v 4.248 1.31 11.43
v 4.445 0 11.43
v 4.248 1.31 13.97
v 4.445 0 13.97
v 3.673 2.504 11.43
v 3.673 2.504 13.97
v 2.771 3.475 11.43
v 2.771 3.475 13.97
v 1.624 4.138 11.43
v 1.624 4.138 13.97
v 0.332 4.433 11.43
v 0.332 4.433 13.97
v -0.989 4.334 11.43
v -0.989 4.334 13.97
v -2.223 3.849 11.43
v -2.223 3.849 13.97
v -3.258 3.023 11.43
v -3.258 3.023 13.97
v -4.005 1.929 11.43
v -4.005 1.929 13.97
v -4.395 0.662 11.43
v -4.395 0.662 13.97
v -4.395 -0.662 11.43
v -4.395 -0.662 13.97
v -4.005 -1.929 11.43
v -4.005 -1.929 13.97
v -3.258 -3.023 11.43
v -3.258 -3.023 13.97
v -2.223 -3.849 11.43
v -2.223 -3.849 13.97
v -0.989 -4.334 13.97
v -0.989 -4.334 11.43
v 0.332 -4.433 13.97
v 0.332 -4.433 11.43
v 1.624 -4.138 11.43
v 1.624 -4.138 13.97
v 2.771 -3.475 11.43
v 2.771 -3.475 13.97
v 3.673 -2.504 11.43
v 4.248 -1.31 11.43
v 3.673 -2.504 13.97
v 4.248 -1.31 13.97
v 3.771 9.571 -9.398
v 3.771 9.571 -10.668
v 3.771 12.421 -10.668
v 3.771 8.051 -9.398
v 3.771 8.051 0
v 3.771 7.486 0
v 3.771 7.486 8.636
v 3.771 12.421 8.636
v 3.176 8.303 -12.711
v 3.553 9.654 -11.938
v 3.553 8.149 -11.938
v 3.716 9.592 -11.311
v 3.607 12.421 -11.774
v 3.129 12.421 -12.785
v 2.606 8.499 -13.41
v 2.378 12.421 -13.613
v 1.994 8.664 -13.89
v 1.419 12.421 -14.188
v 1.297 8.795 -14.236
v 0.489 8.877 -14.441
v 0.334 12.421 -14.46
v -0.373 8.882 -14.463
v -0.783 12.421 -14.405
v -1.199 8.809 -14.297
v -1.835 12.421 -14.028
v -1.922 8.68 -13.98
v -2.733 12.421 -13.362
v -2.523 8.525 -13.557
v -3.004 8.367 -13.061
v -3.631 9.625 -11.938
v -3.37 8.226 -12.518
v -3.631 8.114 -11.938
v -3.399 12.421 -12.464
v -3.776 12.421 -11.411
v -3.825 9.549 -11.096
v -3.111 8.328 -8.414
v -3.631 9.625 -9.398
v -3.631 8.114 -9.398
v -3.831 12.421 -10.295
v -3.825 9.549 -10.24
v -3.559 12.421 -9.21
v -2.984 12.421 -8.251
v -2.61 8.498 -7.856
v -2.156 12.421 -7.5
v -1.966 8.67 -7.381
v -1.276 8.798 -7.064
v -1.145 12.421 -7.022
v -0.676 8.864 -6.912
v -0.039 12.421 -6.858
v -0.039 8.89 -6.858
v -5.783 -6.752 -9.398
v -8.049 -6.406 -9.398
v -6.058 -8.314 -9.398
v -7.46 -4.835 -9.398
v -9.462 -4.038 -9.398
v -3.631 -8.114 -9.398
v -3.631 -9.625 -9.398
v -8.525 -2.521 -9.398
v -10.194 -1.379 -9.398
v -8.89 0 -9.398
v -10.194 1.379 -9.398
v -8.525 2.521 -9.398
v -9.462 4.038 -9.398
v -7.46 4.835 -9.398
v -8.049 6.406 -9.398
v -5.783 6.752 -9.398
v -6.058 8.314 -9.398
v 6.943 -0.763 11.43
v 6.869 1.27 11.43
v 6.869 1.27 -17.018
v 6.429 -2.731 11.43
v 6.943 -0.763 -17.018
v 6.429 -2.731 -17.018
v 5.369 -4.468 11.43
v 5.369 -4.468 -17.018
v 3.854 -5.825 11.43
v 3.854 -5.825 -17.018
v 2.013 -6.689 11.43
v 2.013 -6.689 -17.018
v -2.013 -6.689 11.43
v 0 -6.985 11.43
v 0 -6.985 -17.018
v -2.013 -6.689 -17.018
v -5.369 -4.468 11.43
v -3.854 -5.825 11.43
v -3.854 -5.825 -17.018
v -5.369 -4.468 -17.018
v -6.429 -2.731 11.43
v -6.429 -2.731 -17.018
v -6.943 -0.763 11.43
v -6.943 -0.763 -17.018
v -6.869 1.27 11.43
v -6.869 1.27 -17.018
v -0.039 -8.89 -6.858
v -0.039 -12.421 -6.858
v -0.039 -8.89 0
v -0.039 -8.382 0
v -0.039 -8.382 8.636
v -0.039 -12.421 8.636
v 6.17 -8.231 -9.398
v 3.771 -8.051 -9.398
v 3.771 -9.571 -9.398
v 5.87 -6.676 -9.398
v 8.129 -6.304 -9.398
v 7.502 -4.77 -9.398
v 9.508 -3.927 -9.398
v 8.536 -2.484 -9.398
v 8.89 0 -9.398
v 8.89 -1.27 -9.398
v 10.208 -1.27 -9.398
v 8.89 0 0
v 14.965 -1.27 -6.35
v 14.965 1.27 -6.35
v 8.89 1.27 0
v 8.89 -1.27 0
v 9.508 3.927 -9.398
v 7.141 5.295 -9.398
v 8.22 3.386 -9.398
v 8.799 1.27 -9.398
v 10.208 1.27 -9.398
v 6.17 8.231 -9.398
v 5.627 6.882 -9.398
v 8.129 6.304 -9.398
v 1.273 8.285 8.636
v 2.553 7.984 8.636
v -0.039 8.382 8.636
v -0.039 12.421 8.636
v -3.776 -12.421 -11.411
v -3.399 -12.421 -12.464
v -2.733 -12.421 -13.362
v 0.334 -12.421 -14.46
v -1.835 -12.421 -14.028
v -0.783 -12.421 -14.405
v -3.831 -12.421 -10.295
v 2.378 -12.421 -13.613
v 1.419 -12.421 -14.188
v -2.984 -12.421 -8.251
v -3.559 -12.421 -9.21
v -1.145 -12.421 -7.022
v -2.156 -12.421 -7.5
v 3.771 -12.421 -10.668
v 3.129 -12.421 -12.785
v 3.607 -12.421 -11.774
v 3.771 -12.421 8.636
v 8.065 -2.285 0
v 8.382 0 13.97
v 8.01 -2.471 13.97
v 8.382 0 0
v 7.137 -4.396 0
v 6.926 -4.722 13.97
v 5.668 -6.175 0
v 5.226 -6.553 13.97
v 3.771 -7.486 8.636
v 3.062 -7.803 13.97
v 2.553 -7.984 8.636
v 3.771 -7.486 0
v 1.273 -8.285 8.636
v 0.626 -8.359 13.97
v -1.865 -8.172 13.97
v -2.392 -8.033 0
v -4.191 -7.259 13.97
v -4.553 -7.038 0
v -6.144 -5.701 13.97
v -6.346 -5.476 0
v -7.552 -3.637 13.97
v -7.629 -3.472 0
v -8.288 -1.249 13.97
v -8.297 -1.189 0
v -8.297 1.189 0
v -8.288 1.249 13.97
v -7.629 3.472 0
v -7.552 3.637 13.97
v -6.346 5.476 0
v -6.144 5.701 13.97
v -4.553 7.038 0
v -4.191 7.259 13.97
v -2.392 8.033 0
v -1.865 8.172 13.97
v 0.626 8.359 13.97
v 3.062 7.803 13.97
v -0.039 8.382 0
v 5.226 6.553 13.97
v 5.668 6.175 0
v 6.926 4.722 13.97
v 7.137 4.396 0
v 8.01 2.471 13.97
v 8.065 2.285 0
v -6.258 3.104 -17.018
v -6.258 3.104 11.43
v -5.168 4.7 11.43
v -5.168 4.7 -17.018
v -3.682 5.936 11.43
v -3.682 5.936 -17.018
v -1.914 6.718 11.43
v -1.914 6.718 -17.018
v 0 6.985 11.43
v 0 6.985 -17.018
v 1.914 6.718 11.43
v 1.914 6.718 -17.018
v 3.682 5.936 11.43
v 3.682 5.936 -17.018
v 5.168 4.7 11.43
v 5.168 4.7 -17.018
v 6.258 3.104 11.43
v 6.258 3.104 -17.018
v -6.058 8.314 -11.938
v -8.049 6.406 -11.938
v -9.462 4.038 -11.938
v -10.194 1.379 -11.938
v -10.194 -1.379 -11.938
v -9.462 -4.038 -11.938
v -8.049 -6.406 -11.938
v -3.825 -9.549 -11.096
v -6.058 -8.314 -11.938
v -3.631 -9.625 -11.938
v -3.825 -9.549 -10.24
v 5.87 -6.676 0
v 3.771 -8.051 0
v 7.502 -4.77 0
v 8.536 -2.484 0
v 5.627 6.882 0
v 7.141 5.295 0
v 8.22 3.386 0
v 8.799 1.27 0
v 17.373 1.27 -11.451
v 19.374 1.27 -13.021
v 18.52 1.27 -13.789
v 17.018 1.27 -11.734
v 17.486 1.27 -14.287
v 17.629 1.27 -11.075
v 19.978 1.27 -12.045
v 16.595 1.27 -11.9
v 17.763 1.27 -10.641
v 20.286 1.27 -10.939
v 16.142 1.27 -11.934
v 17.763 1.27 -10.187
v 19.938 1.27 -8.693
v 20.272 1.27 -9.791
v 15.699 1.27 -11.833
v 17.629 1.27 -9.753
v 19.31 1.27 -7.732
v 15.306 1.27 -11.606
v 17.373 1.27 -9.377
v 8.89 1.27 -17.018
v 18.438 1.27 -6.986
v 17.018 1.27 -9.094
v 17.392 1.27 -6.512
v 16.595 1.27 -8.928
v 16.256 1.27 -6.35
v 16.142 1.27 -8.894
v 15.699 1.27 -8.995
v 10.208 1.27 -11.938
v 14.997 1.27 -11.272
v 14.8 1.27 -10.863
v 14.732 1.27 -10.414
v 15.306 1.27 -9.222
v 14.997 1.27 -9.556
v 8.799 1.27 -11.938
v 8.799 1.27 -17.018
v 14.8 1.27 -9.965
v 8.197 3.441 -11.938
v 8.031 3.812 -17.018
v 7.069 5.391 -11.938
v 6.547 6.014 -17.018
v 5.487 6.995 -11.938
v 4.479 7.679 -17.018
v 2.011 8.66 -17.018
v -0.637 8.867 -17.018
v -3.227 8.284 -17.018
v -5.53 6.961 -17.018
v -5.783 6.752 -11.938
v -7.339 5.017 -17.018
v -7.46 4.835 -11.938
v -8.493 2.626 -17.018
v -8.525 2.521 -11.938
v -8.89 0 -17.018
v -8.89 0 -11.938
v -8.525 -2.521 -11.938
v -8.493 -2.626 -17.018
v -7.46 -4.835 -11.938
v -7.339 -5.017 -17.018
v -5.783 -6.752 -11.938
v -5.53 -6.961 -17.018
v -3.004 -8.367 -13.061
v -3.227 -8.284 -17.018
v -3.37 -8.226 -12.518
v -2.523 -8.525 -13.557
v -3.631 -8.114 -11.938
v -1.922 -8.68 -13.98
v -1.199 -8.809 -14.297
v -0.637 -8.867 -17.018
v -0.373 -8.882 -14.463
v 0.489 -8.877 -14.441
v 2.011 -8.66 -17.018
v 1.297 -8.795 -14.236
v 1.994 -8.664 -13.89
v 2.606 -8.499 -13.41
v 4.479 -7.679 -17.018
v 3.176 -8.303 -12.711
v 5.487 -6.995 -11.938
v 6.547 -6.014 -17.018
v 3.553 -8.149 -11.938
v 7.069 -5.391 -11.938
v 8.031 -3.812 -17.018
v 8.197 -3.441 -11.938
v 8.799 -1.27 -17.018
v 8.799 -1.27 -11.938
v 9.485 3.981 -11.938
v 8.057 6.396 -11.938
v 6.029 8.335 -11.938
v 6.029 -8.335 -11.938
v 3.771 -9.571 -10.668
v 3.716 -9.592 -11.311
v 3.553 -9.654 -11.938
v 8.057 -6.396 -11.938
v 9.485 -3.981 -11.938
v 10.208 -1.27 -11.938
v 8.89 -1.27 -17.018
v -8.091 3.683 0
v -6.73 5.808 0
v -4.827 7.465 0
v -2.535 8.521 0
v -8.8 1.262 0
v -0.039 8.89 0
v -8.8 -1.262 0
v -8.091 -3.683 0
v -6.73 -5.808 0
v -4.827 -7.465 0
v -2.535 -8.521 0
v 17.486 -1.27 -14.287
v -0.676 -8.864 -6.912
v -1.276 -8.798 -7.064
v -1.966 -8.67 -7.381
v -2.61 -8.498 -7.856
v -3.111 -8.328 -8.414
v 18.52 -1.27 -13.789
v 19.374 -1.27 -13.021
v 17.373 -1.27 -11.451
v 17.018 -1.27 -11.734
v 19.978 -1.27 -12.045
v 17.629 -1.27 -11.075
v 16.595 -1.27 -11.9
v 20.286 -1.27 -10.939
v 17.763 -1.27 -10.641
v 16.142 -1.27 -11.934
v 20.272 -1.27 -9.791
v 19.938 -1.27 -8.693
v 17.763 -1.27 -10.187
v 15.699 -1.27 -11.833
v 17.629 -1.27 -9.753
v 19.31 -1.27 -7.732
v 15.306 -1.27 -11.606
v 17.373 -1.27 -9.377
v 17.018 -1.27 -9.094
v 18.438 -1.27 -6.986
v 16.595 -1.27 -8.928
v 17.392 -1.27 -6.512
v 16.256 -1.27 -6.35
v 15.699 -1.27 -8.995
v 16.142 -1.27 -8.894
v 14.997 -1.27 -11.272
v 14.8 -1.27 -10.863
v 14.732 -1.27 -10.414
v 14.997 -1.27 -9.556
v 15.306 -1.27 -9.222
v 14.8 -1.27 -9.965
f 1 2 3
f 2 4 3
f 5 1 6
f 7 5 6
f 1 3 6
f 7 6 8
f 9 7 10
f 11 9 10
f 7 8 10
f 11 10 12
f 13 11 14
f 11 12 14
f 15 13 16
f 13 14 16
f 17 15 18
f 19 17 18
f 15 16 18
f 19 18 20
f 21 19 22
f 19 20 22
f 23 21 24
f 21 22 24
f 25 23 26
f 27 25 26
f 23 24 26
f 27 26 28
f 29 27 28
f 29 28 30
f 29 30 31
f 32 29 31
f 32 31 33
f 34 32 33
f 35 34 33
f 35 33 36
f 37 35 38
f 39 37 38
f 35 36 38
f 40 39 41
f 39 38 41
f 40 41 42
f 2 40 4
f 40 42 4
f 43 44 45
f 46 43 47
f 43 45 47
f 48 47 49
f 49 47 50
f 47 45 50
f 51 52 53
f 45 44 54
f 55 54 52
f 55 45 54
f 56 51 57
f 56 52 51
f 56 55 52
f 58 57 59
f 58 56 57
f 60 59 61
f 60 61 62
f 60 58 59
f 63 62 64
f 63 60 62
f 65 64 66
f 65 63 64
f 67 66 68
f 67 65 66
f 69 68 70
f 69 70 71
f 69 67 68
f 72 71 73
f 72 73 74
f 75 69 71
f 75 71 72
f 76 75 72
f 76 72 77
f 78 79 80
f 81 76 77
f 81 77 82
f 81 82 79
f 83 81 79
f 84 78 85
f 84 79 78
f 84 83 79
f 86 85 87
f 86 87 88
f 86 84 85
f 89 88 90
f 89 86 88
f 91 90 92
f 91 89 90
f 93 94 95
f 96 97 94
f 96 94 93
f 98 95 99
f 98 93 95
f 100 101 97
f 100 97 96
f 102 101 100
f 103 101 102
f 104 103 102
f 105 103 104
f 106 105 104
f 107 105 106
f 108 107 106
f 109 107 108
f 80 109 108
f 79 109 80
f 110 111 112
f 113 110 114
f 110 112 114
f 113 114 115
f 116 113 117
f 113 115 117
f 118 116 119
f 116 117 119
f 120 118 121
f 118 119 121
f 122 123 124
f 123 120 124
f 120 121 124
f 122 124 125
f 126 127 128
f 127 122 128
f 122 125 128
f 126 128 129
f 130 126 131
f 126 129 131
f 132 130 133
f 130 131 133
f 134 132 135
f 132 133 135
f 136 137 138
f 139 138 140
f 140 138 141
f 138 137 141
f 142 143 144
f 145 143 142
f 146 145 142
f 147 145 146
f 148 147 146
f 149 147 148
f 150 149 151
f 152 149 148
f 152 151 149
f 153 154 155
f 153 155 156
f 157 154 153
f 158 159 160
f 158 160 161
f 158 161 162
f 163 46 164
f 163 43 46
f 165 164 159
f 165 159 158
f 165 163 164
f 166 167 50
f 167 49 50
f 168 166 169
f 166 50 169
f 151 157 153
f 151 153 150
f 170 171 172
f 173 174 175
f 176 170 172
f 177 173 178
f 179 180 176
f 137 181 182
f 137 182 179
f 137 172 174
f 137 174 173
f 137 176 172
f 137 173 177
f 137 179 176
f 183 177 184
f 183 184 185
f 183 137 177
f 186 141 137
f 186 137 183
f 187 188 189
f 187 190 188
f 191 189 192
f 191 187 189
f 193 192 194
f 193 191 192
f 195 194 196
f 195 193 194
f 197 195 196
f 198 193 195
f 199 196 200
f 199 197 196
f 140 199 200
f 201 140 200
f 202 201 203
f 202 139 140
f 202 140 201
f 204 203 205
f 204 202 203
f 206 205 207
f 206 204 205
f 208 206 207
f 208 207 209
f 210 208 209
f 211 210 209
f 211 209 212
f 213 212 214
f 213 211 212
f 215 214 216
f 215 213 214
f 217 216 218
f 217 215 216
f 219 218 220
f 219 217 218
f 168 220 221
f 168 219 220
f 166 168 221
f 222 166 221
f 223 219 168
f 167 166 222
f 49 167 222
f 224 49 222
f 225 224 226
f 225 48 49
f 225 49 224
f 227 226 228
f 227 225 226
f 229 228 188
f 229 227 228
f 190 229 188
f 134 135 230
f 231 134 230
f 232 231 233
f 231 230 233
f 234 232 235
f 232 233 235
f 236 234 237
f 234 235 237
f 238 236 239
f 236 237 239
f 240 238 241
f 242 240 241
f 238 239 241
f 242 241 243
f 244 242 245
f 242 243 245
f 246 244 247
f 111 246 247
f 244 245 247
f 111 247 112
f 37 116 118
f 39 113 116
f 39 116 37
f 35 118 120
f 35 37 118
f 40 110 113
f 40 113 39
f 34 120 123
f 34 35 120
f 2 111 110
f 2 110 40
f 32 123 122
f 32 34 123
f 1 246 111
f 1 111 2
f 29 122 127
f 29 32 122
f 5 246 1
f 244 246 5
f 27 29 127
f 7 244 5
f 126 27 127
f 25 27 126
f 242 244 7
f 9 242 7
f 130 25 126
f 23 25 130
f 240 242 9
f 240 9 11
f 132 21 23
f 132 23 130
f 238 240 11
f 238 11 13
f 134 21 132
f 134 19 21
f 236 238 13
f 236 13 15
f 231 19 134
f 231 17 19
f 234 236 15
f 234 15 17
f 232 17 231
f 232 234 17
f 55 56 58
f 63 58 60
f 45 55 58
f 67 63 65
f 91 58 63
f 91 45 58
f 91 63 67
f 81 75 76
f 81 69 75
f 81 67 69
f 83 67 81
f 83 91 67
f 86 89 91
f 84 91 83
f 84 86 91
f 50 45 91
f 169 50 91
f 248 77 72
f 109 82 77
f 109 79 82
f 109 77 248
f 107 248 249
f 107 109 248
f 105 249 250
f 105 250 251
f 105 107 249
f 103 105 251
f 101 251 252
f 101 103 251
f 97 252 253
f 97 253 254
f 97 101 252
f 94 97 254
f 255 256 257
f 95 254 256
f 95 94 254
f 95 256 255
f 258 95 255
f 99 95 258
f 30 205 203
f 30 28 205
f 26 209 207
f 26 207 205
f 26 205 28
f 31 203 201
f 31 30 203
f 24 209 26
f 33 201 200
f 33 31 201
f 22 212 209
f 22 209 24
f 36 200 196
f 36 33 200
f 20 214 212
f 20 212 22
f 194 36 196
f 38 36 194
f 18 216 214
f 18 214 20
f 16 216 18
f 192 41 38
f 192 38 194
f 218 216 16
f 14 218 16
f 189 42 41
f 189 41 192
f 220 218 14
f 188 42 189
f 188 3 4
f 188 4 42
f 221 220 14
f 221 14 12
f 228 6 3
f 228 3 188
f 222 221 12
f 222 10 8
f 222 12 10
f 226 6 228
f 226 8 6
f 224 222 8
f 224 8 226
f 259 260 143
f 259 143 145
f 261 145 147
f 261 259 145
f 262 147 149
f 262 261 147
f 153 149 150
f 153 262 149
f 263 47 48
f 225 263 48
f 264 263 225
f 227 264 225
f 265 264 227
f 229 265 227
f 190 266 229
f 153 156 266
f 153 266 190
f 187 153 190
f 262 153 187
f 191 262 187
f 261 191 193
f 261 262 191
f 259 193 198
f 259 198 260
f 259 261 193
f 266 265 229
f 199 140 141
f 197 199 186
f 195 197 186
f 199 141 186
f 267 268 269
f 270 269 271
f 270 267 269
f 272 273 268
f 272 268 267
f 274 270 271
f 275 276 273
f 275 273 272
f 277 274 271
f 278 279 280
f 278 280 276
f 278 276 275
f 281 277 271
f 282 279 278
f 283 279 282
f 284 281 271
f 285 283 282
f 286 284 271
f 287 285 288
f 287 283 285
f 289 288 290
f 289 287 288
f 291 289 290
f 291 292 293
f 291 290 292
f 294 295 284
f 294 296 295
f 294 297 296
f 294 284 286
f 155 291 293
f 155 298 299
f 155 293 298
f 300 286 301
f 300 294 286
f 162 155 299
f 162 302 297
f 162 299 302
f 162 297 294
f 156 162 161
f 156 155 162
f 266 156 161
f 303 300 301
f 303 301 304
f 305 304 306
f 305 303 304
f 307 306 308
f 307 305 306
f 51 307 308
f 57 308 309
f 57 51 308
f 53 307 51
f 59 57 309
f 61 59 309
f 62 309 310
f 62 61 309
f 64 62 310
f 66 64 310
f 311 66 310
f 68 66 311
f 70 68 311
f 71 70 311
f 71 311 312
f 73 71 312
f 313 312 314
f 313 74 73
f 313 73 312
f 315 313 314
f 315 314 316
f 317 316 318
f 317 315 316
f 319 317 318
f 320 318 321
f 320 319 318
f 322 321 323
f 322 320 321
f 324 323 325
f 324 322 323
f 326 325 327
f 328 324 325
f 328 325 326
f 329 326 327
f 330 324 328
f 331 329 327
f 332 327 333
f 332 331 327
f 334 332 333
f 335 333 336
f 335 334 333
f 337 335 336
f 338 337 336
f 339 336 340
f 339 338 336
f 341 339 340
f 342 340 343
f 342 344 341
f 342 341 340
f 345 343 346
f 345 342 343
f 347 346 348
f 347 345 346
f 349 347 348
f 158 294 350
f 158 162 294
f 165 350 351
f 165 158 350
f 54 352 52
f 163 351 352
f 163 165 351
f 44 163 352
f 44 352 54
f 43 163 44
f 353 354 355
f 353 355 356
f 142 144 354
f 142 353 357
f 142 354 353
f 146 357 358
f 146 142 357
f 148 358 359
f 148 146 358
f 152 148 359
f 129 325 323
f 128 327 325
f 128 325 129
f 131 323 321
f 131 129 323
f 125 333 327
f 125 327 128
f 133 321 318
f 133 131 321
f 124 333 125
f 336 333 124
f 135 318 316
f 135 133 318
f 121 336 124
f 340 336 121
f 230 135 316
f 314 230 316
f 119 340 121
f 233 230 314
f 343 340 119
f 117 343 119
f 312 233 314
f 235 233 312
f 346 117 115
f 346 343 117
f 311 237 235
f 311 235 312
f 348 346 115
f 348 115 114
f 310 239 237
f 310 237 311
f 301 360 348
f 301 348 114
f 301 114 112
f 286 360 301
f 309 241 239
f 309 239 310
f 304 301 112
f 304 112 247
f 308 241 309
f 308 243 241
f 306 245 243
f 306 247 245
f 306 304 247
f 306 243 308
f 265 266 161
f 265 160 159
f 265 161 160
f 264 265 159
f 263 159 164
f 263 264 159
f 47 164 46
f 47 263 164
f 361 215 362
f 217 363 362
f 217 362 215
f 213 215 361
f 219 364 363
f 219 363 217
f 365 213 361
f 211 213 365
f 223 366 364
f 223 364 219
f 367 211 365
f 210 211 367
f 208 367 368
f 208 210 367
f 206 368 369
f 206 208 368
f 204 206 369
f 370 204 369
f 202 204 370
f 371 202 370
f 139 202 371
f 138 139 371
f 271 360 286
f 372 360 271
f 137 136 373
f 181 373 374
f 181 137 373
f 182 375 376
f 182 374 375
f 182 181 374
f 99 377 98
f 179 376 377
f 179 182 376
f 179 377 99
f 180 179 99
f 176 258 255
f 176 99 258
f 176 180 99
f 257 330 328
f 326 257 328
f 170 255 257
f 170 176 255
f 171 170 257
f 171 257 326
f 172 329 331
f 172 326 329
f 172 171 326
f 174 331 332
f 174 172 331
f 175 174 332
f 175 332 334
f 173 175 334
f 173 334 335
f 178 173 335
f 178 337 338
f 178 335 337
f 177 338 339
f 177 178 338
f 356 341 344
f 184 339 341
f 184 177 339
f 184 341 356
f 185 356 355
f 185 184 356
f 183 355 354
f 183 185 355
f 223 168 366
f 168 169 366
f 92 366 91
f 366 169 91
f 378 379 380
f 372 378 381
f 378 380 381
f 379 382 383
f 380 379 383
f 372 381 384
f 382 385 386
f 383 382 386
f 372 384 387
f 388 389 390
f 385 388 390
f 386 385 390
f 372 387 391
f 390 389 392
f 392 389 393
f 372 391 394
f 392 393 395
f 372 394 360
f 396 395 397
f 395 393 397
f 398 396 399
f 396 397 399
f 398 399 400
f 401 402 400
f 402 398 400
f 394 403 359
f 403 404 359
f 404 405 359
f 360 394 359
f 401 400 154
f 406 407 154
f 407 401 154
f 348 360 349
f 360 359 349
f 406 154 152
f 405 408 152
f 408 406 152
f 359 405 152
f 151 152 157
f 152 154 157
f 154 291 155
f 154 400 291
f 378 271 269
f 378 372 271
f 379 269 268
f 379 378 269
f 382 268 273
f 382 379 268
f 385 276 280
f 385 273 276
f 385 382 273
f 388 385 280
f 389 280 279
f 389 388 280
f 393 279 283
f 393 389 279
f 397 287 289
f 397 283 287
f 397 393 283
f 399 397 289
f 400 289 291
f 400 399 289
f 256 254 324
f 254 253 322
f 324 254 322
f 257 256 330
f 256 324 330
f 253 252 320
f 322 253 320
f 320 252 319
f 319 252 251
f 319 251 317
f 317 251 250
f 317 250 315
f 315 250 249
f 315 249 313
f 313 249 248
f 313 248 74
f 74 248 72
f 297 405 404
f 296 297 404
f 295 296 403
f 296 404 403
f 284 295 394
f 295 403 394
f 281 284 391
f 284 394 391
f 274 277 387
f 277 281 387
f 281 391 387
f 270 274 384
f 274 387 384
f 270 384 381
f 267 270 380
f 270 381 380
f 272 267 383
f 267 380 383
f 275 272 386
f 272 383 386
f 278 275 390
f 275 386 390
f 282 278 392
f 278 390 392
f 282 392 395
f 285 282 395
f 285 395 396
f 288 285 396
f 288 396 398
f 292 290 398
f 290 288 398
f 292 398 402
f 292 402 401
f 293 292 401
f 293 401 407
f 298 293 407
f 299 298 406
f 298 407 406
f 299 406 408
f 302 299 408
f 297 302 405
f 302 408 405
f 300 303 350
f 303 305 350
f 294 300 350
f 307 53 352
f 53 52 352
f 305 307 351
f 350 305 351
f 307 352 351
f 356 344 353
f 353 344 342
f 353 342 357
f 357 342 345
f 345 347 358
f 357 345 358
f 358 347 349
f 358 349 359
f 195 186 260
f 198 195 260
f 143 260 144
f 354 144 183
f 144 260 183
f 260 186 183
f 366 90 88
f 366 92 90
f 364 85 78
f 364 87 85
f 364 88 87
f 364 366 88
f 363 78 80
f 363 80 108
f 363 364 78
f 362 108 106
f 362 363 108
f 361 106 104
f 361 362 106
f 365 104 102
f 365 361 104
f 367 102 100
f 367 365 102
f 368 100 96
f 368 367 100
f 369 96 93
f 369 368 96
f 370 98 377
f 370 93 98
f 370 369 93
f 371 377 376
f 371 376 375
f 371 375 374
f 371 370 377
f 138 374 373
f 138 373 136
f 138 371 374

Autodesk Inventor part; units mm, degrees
ref_plane "YZ Plane" through (0, 0, 0) normal (1, 0, 0) x (0, 1, 0)
sketch "Sketch2" plane through (0, 0, 0) normal (0, 0, 1) x (1, 0, 0)
  circle A0 centre (0, 0) radius 8.382
  dimension "d0" = 16.764
extrude "Extrusion1" add sketch "Sketch2" along normal blind 13.97
sketch "Sketch3" plane through (0, 0, 0) normal (0, 0, -1) x (-1, 0, 0)
  circle A0 centre (0, 0) radius 8.382 projected
  circle A1 centre (0, 0) radius 8.89
  dimension "d3" = 17.78
extrude "Extrusion2" add sketch "Sketch3" along normal blind 17.018 contours A0 | A1
ref_plane "Work Plane1" through (0, 0, -9.398) normal (0, 0, 1) x (1, 0, 0)
sketch "Sketch4" plane through (0, 0, -9.398) normal (0, 0, 1) x (1, 0, 0)
  circle A0 centre (0, 0) radius 8.89
  circle A1 centre (0, 0) radius 10.287
  circle A2 centre (0, 0) radius 8.89 projected
  dimension "d7" = 20.574
extrude "Extrusion3" add sketch "Sketch4" against normal blind 2.54
sketch "Sketch9" plane through (0, 0, -17.018) normal (0, 0, -1) x (-1, 0, 0)
  circle A0 centre (0, 0) radius 8.89 projected
  circle A1 centre (0, 0) radius 6.985
  dimension "d40" = 13.97
extrude "Extrusion7" cut sketch "Sketch9" against normal blind 28.448 contours A1
sketch "Sketch10" plane through (0, 0, 13.97) normal (0, 0, 1) x (1, 0, 0)
  circle A0 centre (0, 0) radius 8.382 projected
  circle A1 centre (0, 0) radius 4.445
  dimension "d43" = 8.89
extrude "Extrusion8" cut sketch "Sketch10" against normal up to surface (2.54 mm away) contours A1
sketch "Sketch12" plane through (0, 0, 0) normal (0, 1, 0) x (-1, 0, 0)
  line L0 (8.89, -17.018) -> (-8.89, -17.018) projected
  line L1 (-13.7704, -25.0461) -> (-13.7704, -36.5125) construction
  circle A0 centre (-16.256, -10.414) radius 1.524
  arc A1 (-16.256, -6.35) -> (-17.4864, -14.2873) centre (-16.256, -10.414) ccw
  line L2 (-16.256, -6.35) -> (-14.965, -6.35)
  line L3 (-14.965, -6.35) -> (-8.89, 0)
  line L4 (-8.89, 0) -> (-8.89, -9.398) projected
  line L5 (-8.89, -17.018) -> (-17.4864, -14.2873)
  line L6 (-8.89, 0) -> (-8.89, -17.018)
  point P0 (0, 0)
  dimension "d54" = 3.048
  dimension "d55" = 8.128
  dimension "d56" = 6.604
  dimension "d57" = 16.256
extrude "Extrusion9" add sketch "Sketch12" along normal mid plane 2.54
sketch "Sketch14" plane through (8.89, -1.27, -9.398) normal (-1, 0, 0) x (0, 0, 1)
  line L0 (0, 0) -> (0, 1.27) projected
  line L1 (0, 0) -> (9.398, 0) projected
  line L2 (9.398, 1.27) -> (9.398, 0) projected
  line L3 (9.398, 1.27) -> (0, 1.27) projected
  line L4 (-7.62, 2.54) -> (9.398, 2.54)
  line L5 (9.398, 2.54) -> (9.398, 0)
  line L6 (9.398, 0) -> (-7.62, 0)
  line L7 (-7.62, 0) -> (-7.62, 2.54)
extrude "Extrusion11" add sketch "Sketch14" along normal up to next contours L6 L7 L4 L5 L3 L0
sketch "Sketch15" plane through (0, 0, -17.018) normal (0, 0, -1) x (-1, 0, 0)
  arc A0 (6.8686, 1.27) -> (-6.8686, 1.27) centre (0, 0) ccw projected
  circle A1 centre (0, 0) radius 6.985
extrude "Extrusion12" cut sketch "Sketch15" against normal up to surface (28.448 mm away)
ref_plane "Work Plane8" through (0, 12.4206, 0) normal (0, 1, 0) x (-1, 0, 0)
sketch "Sketch16" plane through (0, 12.4206, 0) normal (0, 1, 0) x (-1, 0, 0)
  arc A0 (-3.7707, -10.668) -> (0.0393, -6.858) centre (0.0393, -10.668) ccw
  line L0 (-10.2083, -9.398) -> (10.287, -9.398) projected
  line L1 (10.287, -11.938) -> (-10.2083, -11.938) projected
  line L2 (-10.2083, -9.398) -> (10.287, -11.938) construction
  line L3 (-3.7707, -10.668) -> (-3.7707, 8.636)
  line L4 (-3.7707, 8.636) -> (0.0393, 8.636)
  line L5 (0.0393, 8.636) -> (0.0393, -6.858)
  line L6 (-8.382, 13.97) -> (8.382, 13.97) projected
  point P0 (0, 0)
  dimension "d63" = 7.62
  dimension "d65" = 3.81
  dimension "d66" = 5.334
extrude "Extrusion13" add sketch "Sketch16" against normal up to next
mirror "Mirror2" about plane through (0, 0, 0) normal (0, 1, 0) of "Extrusion13"
properties part number "Front Axle Body"
